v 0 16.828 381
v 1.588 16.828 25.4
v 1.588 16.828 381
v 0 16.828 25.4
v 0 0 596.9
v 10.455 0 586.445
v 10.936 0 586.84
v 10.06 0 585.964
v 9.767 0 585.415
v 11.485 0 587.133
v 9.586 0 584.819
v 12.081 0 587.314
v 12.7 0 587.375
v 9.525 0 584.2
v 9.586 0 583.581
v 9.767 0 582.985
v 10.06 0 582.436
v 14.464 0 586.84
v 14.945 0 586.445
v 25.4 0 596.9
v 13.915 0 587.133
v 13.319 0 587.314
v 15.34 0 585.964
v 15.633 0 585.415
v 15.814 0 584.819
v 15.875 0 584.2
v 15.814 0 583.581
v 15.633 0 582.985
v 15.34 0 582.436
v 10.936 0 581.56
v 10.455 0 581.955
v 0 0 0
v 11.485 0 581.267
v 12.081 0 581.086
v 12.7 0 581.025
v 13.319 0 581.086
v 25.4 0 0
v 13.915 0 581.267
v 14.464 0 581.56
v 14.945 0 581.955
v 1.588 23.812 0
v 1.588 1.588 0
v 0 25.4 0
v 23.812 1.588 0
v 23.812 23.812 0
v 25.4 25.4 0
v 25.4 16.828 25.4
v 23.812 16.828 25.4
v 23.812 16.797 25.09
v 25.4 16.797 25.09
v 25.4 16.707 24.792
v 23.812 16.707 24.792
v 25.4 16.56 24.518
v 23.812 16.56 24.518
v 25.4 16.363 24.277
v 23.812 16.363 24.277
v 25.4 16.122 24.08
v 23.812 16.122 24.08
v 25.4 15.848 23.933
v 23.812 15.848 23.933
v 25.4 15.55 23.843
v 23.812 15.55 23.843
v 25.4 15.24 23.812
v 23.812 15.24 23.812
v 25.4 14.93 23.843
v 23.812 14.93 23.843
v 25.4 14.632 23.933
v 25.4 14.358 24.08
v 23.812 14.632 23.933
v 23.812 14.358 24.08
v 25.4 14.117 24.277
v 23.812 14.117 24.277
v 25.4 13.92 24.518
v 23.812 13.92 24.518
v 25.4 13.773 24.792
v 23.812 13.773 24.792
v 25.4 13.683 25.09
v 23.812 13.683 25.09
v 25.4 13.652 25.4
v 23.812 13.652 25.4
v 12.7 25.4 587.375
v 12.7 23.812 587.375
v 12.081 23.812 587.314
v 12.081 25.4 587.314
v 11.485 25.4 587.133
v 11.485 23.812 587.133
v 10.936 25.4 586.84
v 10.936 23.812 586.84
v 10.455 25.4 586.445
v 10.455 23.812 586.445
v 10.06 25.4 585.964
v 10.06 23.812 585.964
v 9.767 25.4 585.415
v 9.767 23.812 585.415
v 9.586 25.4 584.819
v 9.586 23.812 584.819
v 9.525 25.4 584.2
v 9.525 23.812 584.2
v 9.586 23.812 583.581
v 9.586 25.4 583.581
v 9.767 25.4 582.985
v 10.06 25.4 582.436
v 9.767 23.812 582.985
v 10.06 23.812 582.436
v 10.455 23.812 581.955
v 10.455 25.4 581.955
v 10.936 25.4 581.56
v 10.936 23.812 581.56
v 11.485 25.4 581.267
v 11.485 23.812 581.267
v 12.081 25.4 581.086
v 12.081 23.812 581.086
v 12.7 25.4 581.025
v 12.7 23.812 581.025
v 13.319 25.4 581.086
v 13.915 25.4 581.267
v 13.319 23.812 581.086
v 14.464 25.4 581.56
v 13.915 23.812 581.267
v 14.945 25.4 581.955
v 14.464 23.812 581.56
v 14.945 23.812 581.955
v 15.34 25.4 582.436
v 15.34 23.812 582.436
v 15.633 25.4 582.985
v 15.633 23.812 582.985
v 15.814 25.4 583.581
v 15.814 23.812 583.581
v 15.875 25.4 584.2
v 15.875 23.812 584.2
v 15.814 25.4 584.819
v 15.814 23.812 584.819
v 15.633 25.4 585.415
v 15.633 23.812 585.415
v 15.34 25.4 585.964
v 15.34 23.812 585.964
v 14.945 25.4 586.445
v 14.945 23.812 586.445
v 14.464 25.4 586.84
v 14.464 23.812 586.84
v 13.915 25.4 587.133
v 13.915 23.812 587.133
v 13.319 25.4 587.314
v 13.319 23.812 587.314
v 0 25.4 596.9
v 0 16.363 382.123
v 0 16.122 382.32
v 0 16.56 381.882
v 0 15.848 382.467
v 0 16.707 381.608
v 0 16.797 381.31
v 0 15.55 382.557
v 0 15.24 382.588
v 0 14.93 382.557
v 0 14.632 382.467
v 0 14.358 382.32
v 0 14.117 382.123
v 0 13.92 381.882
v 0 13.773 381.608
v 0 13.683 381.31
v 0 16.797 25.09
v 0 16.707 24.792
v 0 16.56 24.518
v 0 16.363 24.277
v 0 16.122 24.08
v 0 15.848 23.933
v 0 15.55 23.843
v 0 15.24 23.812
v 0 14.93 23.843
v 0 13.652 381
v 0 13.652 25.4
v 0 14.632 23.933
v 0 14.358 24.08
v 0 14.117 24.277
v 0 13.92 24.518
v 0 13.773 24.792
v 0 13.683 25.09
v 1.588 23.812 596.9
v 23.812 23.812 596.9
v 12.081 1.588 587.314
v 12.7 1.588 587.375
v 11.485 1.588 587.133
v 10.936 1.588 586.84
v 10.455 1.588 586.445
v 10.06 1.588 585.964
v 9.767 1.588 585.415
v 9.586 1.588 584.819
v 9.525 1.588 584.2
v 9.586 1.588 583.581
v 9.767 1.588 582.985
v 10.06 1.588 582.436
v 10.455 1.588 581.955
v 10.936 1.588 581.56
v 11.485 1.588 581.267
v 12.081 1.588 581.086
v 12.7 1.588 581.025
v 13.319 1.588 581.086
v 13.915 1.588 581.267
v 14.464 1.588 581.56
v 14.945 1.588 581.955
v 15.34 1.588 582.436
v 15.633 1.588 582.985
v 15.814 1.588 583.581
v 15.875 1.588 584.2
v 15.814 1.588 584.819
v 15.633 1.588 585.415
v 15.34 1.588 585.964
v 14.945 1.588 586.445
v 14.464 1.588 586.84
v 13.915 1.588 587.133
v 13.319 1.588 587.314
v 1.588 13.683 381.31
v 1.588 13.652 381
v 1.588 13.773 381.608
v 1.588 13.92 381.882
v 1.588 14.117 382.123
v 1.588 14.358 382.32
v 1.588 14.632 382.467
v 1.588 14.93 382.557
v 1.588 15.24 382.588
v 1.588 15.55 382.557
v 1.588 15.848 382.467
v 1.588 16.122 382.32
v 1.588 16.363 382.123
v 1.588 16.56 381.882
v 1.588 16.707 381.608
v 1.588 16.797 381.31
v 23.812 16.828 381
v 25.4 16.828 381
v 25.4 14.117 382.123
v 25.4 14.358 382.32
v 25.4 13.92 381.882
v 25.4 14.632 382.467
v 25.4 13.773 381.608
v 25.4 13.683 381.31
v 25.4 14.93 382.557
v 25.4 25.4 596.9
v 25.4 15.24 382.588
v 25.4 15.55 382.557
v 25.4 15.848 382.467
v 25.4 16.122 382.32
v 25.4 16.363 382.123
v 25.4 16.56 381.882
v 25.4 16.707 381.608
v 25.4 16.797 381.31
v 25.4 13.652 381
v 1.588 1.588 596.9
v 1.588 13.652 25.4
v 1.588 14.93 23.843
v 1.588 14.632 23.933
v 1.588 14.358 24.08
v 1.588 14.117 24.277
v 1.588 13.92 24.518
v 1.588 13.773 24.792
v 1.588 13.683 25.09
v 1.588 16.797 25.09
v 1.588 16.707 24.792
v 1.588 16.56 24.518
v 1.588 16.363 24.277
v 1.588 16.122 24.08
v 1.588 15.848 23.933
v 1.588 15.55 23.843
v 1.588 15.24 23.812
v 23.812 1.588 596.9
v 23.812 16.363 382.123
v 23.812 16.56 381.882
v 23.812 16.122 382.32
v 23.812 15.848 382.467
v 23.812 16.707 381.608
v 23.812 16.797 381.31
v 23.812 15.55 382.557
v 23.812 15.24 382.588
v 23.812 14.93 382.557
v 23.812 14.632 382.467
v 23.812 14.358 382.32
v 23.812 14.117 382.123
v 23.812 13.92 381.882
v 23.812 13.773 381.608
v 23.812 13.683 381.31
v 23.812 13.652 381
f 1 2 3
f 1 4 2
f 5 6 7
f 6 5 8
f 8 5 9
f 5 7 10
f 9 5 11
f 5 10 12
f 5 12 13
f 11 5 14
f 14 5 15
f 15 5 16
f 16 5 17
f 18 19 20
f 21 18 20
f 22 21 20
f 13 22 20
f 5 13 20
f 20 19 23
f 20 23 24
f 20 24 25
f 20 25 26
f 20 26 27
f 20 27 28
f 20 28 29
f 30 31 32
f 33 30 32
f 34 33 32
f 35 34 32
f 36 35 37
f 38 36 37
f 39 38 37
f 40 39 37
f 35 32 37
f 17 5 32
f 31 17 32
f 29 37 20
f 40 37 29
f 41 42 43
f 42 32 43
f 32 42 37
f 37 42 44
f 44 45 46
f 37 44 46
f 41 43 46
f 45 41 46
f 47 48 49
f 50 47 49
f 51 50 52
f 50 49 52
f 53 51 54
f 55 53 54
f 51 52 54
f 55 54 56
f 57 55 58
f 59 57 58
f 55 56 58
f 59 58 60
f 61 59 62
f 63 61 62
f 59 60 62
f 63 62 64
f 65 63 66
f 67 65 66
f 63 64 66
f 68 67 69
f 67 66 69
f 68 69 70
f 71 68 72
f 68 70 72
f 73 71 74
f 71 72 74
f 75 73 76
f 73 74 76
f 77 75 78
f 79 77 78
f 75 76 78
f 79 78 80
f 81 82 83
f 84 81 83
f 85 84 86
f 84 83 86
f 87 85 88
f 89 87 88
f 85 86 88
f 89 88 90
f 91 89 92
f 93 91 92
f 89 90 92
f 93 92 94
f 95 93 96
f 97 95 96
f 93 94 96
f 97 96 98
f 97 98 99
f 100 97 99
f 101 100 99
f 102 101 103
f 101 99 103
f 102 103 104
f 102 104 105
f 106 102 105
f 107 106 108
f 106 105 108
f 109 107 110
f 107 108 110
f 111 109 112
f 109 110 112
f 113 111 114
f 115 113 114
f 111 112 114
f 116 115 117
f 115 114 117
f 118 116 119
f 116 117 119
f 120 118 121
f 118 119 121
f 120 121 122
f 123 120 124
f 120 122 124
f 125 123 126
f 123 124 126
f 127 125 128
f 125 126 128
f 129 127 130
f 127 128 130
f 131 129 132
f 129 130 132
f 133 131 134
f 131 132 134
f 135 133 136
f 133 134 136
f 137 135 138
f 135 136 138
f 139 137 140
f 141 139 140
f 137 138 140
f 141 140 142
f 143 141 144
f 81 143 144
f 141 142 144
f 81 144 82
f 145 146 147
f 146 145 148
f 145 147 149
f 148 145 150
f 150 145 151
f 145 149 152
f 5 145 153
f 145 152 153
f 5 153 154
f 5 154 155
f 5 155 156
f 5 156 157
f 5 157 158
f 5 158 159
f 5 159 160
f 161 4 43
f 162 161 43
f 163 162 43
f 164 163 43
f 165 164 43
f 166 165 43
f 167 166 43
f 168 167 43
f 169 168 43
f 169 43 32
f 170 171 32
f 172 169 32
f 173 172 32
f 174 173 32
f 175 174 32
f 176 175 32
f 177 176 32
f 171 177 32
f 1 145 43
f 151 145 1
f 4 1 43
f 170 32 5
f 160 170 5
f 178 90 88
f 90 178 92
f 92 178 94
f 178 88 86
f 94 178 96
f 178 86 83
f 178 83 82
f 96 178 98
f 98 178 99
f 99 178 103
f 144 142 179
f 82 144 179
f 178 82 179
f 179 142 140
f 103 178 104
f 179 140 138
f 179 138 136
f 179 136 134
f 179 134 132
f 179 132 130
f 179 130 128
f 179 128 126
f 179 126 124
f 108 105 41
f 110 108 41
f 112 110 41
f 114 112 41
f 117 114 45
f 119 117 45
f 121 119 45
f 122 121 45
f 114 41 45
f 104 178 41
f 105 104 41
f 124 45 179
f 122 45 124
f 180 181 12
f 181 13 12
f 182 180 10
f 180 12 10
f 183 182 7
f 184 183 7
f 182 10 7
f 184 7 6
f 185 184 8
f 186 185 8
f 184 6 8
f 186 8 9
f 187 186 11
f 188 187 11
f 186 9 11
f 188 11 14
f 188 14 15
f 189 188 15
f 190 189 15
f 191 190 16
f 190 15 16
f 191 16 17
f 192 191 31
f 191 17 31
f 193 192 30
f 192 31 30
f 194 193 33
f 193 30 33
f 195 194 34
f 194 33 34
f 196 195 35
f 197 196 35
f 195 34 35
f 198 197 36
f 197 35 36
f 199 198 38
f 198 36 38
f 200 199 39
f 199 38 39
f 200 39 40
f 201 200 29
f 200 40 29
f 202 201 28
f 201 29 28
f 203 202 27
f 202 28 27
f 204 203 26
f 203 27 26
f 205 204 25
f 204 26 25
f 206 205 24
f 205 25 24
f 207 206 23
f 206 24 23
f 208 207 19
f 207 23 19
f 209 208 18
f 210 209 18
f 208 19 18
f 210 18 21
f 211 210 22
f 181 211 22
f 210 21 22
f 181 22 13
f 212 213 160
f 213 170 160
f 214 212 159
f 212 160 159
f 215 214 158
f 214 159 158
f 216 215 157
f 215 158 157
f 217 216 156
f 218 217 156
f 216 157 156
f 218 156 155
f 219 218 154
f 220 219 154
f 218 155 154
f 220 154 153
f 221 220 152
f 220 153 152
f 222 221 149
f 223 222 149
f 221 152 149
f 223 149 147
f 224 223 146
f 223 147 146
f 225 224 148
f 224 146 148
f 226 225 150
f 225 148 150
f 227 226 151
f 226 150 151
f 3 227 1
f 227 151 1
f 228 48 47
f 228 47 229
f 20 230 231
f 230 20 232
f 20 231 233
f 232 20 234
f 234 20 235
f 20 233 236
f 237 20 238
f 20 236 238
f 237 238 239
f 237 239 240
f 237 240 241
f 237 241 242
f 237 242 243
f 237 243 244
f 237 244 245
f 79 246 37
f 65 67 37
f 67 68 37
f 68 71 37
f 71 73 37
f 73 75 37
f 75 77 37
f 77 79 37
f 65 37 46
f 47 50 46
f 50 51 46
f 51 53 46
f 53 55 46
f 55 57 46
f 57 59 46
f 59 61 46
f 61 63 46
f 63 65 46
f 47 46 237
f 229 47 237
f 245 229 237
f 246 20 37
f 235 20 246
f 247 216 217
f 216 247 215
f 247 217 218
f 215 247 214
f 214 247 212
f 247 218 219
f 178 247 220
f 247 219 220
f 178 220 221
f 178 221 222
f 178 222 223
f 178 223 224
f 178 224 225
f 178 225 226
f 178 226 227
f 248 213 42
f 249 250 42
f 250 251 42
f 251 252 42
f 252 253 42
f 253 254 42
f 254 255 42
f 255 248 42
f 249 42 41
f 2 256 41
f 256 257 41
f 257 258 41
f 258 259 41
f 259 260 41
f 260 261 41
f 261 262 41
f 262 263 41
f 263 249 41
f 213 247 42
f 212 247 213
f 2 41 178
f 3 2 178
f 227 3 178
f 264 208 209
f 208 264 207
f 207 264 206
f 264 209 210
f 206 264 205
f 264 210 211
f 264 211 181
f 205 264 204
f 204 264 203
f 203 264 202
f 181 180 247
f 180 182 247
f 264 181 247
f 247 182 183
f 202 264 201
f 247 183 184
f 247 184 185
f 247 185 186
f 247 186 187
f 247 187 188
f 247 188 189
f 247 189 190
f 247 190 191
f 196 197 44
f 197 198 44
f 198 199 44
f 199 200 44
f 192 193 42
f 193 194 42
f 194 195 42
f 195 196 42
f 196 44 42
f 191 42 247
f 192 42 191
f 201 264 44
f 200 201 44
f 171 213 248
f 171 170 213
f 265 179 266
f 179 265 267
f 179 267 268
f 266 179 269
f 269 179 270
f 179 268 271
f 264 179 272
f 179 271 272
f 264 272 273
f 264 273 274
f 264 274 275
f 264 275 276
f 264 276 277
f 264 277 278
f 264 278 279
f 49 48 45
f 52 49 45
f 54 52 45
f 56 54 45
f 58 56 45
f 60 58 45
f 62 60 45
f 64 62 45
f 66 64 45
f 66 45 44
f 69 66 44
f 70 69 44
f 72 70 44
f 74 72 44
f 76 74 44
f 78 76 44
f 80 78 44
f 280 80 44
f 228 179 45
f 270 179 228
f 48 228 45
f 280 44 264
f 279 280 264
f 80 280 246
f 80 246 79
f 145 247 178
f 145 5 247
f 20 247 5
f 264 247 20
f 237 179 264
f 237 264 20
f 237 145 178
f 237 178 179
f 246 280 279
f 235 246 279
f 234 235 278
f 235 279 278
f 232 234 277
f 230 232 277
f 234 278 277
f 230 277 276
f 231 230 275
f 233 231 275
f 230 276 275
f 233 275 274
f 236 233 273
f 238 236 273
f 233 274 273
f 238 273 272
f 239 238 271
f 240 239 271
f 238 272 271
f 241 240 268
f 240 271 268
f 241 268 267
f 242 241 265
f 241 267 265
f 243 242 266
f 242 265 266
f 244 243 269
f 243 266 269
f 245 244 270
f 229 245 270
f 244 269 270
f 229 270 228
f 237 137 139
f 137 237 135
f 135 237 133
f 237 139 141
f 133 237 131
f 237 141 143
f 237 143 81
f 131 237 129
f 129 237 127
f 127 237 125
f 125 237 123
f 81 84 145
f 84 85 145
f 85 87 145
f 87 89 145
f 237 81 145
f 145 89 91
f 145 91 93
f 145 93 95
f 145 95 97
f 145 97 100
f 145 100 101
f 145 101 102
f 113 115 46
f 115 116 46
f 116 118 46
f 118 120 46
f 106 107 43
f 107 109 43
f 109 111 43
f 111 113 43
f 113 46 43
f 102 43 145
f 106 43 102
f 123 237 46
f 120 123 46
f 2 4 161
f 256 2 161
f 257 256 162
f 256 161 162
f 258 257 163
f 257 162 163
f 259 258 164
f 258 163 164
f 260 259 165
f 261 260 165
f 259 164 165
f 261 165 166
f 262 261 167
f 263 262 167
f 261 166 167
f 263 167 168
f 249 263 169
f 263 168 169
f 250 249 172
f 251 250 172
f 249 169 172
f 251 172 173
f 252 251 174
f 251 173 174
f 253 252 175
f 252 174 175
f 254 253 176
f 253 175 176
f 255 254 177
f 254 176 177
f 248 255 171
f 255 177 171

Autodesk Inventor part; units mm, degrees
ref_plane "YZ Plane" through (0, 0, 0) normal (1, 0, 0) x (0, 1, 0)
ref_plane "XZ Plane" through (0, 0, 0) normal (0, 1, 0) x (-1, 0, 0)
ref_plane "XY Plane" through (0, 0, 0) normal (0, 0, 1) x (1, 0, 0)
sketch "Sketch1" plane through (0, 0, 0) normal (0, 0, 1) x (1, 0, 0)
  line L0 (0, 0) -> (25.4, 0)
  line L1 (25.4, 0) -> (25.4, 25.4)
  line L2 (25.4, 25.4) -> (0, 25.4)
  line L3 (0, 25.4) -> (0, 0)
  line L4 (1.5875, 23.8125) -> (23.8125, 23.8125)
  line L5 (23.8125, 23.8125) -> (23.8125, 1.5875)
  line L6 (23.8125, 1.5875) -> (1.5875, 1.5875)
  line L7 (1.5875, 1.5875) -> (1.5875, 23.8125)
  dimension "d0" = 25.4
  dimension "d1" = 25.4
  dimension "d2" = 1.5875
extrude "Extrusion1" add sketch "Sketch1" along normal blind 596.9
sketch "Sketch2" plane through (0, 0, 0) normal (-1, 0, 0) x (0, 0, 1)
  line L0 (0, 25.4) -> (0, 0) projected
  line L1 (0, 0) -> (596.9, 0) projected
  line L2 (596.9, 25.4) -> (596.9, 0) projected
  line L3 (0, 25.4) -> (596.9, 25.4) projected
  line L4 (25.4, 16.8275) -> (381, 16.8275)
  arc A0 (381, 13.6525) -> (381, 16.8275) centre (381, 15.24) ccw
  line L5 (381, 13.6525) -> (25.4, 13.6525)
  arc A1 (25.4, 16.8275) -> (25.4, 13.6525) centre (25.4, 15.24) ccw
  dimension "d5" = 3.175
  dimension "d6" = 355.6
  dimension "d9" = 10.16
  dimension "d24" = 25.4
extrude "Extrusion2" cut sketch "Sketch2" against normal through all contours L4 A0 L5 A1
sketch "Sketch3" plane through (0, 25.4, 0) normal (0, 1, 0) x (1, 0, 0)
  line L0 (25.4, 0) -> (0, 0) projected
  line L1 (0, 0) -> (0, -596.9) projected
  line L2 (25.4, -596.9) -> (0, -596.9) projected
  line L3 (25.4, 0) -> (25.4, -596.9) projected
  point P0 (0, 0)
  point P1 (12.7, -584.2)
  dimension "d13" = 12.7
  dimension "d14" = 12.7
  dimension "d23" = 12.7
hole "Hole1" at (12.7, 25.4, 584.2) direction (0, -1, 0) diameter 6.35 end through all
equation "\"d13\" = d14"
properties part number "ScissorLiftBase"
